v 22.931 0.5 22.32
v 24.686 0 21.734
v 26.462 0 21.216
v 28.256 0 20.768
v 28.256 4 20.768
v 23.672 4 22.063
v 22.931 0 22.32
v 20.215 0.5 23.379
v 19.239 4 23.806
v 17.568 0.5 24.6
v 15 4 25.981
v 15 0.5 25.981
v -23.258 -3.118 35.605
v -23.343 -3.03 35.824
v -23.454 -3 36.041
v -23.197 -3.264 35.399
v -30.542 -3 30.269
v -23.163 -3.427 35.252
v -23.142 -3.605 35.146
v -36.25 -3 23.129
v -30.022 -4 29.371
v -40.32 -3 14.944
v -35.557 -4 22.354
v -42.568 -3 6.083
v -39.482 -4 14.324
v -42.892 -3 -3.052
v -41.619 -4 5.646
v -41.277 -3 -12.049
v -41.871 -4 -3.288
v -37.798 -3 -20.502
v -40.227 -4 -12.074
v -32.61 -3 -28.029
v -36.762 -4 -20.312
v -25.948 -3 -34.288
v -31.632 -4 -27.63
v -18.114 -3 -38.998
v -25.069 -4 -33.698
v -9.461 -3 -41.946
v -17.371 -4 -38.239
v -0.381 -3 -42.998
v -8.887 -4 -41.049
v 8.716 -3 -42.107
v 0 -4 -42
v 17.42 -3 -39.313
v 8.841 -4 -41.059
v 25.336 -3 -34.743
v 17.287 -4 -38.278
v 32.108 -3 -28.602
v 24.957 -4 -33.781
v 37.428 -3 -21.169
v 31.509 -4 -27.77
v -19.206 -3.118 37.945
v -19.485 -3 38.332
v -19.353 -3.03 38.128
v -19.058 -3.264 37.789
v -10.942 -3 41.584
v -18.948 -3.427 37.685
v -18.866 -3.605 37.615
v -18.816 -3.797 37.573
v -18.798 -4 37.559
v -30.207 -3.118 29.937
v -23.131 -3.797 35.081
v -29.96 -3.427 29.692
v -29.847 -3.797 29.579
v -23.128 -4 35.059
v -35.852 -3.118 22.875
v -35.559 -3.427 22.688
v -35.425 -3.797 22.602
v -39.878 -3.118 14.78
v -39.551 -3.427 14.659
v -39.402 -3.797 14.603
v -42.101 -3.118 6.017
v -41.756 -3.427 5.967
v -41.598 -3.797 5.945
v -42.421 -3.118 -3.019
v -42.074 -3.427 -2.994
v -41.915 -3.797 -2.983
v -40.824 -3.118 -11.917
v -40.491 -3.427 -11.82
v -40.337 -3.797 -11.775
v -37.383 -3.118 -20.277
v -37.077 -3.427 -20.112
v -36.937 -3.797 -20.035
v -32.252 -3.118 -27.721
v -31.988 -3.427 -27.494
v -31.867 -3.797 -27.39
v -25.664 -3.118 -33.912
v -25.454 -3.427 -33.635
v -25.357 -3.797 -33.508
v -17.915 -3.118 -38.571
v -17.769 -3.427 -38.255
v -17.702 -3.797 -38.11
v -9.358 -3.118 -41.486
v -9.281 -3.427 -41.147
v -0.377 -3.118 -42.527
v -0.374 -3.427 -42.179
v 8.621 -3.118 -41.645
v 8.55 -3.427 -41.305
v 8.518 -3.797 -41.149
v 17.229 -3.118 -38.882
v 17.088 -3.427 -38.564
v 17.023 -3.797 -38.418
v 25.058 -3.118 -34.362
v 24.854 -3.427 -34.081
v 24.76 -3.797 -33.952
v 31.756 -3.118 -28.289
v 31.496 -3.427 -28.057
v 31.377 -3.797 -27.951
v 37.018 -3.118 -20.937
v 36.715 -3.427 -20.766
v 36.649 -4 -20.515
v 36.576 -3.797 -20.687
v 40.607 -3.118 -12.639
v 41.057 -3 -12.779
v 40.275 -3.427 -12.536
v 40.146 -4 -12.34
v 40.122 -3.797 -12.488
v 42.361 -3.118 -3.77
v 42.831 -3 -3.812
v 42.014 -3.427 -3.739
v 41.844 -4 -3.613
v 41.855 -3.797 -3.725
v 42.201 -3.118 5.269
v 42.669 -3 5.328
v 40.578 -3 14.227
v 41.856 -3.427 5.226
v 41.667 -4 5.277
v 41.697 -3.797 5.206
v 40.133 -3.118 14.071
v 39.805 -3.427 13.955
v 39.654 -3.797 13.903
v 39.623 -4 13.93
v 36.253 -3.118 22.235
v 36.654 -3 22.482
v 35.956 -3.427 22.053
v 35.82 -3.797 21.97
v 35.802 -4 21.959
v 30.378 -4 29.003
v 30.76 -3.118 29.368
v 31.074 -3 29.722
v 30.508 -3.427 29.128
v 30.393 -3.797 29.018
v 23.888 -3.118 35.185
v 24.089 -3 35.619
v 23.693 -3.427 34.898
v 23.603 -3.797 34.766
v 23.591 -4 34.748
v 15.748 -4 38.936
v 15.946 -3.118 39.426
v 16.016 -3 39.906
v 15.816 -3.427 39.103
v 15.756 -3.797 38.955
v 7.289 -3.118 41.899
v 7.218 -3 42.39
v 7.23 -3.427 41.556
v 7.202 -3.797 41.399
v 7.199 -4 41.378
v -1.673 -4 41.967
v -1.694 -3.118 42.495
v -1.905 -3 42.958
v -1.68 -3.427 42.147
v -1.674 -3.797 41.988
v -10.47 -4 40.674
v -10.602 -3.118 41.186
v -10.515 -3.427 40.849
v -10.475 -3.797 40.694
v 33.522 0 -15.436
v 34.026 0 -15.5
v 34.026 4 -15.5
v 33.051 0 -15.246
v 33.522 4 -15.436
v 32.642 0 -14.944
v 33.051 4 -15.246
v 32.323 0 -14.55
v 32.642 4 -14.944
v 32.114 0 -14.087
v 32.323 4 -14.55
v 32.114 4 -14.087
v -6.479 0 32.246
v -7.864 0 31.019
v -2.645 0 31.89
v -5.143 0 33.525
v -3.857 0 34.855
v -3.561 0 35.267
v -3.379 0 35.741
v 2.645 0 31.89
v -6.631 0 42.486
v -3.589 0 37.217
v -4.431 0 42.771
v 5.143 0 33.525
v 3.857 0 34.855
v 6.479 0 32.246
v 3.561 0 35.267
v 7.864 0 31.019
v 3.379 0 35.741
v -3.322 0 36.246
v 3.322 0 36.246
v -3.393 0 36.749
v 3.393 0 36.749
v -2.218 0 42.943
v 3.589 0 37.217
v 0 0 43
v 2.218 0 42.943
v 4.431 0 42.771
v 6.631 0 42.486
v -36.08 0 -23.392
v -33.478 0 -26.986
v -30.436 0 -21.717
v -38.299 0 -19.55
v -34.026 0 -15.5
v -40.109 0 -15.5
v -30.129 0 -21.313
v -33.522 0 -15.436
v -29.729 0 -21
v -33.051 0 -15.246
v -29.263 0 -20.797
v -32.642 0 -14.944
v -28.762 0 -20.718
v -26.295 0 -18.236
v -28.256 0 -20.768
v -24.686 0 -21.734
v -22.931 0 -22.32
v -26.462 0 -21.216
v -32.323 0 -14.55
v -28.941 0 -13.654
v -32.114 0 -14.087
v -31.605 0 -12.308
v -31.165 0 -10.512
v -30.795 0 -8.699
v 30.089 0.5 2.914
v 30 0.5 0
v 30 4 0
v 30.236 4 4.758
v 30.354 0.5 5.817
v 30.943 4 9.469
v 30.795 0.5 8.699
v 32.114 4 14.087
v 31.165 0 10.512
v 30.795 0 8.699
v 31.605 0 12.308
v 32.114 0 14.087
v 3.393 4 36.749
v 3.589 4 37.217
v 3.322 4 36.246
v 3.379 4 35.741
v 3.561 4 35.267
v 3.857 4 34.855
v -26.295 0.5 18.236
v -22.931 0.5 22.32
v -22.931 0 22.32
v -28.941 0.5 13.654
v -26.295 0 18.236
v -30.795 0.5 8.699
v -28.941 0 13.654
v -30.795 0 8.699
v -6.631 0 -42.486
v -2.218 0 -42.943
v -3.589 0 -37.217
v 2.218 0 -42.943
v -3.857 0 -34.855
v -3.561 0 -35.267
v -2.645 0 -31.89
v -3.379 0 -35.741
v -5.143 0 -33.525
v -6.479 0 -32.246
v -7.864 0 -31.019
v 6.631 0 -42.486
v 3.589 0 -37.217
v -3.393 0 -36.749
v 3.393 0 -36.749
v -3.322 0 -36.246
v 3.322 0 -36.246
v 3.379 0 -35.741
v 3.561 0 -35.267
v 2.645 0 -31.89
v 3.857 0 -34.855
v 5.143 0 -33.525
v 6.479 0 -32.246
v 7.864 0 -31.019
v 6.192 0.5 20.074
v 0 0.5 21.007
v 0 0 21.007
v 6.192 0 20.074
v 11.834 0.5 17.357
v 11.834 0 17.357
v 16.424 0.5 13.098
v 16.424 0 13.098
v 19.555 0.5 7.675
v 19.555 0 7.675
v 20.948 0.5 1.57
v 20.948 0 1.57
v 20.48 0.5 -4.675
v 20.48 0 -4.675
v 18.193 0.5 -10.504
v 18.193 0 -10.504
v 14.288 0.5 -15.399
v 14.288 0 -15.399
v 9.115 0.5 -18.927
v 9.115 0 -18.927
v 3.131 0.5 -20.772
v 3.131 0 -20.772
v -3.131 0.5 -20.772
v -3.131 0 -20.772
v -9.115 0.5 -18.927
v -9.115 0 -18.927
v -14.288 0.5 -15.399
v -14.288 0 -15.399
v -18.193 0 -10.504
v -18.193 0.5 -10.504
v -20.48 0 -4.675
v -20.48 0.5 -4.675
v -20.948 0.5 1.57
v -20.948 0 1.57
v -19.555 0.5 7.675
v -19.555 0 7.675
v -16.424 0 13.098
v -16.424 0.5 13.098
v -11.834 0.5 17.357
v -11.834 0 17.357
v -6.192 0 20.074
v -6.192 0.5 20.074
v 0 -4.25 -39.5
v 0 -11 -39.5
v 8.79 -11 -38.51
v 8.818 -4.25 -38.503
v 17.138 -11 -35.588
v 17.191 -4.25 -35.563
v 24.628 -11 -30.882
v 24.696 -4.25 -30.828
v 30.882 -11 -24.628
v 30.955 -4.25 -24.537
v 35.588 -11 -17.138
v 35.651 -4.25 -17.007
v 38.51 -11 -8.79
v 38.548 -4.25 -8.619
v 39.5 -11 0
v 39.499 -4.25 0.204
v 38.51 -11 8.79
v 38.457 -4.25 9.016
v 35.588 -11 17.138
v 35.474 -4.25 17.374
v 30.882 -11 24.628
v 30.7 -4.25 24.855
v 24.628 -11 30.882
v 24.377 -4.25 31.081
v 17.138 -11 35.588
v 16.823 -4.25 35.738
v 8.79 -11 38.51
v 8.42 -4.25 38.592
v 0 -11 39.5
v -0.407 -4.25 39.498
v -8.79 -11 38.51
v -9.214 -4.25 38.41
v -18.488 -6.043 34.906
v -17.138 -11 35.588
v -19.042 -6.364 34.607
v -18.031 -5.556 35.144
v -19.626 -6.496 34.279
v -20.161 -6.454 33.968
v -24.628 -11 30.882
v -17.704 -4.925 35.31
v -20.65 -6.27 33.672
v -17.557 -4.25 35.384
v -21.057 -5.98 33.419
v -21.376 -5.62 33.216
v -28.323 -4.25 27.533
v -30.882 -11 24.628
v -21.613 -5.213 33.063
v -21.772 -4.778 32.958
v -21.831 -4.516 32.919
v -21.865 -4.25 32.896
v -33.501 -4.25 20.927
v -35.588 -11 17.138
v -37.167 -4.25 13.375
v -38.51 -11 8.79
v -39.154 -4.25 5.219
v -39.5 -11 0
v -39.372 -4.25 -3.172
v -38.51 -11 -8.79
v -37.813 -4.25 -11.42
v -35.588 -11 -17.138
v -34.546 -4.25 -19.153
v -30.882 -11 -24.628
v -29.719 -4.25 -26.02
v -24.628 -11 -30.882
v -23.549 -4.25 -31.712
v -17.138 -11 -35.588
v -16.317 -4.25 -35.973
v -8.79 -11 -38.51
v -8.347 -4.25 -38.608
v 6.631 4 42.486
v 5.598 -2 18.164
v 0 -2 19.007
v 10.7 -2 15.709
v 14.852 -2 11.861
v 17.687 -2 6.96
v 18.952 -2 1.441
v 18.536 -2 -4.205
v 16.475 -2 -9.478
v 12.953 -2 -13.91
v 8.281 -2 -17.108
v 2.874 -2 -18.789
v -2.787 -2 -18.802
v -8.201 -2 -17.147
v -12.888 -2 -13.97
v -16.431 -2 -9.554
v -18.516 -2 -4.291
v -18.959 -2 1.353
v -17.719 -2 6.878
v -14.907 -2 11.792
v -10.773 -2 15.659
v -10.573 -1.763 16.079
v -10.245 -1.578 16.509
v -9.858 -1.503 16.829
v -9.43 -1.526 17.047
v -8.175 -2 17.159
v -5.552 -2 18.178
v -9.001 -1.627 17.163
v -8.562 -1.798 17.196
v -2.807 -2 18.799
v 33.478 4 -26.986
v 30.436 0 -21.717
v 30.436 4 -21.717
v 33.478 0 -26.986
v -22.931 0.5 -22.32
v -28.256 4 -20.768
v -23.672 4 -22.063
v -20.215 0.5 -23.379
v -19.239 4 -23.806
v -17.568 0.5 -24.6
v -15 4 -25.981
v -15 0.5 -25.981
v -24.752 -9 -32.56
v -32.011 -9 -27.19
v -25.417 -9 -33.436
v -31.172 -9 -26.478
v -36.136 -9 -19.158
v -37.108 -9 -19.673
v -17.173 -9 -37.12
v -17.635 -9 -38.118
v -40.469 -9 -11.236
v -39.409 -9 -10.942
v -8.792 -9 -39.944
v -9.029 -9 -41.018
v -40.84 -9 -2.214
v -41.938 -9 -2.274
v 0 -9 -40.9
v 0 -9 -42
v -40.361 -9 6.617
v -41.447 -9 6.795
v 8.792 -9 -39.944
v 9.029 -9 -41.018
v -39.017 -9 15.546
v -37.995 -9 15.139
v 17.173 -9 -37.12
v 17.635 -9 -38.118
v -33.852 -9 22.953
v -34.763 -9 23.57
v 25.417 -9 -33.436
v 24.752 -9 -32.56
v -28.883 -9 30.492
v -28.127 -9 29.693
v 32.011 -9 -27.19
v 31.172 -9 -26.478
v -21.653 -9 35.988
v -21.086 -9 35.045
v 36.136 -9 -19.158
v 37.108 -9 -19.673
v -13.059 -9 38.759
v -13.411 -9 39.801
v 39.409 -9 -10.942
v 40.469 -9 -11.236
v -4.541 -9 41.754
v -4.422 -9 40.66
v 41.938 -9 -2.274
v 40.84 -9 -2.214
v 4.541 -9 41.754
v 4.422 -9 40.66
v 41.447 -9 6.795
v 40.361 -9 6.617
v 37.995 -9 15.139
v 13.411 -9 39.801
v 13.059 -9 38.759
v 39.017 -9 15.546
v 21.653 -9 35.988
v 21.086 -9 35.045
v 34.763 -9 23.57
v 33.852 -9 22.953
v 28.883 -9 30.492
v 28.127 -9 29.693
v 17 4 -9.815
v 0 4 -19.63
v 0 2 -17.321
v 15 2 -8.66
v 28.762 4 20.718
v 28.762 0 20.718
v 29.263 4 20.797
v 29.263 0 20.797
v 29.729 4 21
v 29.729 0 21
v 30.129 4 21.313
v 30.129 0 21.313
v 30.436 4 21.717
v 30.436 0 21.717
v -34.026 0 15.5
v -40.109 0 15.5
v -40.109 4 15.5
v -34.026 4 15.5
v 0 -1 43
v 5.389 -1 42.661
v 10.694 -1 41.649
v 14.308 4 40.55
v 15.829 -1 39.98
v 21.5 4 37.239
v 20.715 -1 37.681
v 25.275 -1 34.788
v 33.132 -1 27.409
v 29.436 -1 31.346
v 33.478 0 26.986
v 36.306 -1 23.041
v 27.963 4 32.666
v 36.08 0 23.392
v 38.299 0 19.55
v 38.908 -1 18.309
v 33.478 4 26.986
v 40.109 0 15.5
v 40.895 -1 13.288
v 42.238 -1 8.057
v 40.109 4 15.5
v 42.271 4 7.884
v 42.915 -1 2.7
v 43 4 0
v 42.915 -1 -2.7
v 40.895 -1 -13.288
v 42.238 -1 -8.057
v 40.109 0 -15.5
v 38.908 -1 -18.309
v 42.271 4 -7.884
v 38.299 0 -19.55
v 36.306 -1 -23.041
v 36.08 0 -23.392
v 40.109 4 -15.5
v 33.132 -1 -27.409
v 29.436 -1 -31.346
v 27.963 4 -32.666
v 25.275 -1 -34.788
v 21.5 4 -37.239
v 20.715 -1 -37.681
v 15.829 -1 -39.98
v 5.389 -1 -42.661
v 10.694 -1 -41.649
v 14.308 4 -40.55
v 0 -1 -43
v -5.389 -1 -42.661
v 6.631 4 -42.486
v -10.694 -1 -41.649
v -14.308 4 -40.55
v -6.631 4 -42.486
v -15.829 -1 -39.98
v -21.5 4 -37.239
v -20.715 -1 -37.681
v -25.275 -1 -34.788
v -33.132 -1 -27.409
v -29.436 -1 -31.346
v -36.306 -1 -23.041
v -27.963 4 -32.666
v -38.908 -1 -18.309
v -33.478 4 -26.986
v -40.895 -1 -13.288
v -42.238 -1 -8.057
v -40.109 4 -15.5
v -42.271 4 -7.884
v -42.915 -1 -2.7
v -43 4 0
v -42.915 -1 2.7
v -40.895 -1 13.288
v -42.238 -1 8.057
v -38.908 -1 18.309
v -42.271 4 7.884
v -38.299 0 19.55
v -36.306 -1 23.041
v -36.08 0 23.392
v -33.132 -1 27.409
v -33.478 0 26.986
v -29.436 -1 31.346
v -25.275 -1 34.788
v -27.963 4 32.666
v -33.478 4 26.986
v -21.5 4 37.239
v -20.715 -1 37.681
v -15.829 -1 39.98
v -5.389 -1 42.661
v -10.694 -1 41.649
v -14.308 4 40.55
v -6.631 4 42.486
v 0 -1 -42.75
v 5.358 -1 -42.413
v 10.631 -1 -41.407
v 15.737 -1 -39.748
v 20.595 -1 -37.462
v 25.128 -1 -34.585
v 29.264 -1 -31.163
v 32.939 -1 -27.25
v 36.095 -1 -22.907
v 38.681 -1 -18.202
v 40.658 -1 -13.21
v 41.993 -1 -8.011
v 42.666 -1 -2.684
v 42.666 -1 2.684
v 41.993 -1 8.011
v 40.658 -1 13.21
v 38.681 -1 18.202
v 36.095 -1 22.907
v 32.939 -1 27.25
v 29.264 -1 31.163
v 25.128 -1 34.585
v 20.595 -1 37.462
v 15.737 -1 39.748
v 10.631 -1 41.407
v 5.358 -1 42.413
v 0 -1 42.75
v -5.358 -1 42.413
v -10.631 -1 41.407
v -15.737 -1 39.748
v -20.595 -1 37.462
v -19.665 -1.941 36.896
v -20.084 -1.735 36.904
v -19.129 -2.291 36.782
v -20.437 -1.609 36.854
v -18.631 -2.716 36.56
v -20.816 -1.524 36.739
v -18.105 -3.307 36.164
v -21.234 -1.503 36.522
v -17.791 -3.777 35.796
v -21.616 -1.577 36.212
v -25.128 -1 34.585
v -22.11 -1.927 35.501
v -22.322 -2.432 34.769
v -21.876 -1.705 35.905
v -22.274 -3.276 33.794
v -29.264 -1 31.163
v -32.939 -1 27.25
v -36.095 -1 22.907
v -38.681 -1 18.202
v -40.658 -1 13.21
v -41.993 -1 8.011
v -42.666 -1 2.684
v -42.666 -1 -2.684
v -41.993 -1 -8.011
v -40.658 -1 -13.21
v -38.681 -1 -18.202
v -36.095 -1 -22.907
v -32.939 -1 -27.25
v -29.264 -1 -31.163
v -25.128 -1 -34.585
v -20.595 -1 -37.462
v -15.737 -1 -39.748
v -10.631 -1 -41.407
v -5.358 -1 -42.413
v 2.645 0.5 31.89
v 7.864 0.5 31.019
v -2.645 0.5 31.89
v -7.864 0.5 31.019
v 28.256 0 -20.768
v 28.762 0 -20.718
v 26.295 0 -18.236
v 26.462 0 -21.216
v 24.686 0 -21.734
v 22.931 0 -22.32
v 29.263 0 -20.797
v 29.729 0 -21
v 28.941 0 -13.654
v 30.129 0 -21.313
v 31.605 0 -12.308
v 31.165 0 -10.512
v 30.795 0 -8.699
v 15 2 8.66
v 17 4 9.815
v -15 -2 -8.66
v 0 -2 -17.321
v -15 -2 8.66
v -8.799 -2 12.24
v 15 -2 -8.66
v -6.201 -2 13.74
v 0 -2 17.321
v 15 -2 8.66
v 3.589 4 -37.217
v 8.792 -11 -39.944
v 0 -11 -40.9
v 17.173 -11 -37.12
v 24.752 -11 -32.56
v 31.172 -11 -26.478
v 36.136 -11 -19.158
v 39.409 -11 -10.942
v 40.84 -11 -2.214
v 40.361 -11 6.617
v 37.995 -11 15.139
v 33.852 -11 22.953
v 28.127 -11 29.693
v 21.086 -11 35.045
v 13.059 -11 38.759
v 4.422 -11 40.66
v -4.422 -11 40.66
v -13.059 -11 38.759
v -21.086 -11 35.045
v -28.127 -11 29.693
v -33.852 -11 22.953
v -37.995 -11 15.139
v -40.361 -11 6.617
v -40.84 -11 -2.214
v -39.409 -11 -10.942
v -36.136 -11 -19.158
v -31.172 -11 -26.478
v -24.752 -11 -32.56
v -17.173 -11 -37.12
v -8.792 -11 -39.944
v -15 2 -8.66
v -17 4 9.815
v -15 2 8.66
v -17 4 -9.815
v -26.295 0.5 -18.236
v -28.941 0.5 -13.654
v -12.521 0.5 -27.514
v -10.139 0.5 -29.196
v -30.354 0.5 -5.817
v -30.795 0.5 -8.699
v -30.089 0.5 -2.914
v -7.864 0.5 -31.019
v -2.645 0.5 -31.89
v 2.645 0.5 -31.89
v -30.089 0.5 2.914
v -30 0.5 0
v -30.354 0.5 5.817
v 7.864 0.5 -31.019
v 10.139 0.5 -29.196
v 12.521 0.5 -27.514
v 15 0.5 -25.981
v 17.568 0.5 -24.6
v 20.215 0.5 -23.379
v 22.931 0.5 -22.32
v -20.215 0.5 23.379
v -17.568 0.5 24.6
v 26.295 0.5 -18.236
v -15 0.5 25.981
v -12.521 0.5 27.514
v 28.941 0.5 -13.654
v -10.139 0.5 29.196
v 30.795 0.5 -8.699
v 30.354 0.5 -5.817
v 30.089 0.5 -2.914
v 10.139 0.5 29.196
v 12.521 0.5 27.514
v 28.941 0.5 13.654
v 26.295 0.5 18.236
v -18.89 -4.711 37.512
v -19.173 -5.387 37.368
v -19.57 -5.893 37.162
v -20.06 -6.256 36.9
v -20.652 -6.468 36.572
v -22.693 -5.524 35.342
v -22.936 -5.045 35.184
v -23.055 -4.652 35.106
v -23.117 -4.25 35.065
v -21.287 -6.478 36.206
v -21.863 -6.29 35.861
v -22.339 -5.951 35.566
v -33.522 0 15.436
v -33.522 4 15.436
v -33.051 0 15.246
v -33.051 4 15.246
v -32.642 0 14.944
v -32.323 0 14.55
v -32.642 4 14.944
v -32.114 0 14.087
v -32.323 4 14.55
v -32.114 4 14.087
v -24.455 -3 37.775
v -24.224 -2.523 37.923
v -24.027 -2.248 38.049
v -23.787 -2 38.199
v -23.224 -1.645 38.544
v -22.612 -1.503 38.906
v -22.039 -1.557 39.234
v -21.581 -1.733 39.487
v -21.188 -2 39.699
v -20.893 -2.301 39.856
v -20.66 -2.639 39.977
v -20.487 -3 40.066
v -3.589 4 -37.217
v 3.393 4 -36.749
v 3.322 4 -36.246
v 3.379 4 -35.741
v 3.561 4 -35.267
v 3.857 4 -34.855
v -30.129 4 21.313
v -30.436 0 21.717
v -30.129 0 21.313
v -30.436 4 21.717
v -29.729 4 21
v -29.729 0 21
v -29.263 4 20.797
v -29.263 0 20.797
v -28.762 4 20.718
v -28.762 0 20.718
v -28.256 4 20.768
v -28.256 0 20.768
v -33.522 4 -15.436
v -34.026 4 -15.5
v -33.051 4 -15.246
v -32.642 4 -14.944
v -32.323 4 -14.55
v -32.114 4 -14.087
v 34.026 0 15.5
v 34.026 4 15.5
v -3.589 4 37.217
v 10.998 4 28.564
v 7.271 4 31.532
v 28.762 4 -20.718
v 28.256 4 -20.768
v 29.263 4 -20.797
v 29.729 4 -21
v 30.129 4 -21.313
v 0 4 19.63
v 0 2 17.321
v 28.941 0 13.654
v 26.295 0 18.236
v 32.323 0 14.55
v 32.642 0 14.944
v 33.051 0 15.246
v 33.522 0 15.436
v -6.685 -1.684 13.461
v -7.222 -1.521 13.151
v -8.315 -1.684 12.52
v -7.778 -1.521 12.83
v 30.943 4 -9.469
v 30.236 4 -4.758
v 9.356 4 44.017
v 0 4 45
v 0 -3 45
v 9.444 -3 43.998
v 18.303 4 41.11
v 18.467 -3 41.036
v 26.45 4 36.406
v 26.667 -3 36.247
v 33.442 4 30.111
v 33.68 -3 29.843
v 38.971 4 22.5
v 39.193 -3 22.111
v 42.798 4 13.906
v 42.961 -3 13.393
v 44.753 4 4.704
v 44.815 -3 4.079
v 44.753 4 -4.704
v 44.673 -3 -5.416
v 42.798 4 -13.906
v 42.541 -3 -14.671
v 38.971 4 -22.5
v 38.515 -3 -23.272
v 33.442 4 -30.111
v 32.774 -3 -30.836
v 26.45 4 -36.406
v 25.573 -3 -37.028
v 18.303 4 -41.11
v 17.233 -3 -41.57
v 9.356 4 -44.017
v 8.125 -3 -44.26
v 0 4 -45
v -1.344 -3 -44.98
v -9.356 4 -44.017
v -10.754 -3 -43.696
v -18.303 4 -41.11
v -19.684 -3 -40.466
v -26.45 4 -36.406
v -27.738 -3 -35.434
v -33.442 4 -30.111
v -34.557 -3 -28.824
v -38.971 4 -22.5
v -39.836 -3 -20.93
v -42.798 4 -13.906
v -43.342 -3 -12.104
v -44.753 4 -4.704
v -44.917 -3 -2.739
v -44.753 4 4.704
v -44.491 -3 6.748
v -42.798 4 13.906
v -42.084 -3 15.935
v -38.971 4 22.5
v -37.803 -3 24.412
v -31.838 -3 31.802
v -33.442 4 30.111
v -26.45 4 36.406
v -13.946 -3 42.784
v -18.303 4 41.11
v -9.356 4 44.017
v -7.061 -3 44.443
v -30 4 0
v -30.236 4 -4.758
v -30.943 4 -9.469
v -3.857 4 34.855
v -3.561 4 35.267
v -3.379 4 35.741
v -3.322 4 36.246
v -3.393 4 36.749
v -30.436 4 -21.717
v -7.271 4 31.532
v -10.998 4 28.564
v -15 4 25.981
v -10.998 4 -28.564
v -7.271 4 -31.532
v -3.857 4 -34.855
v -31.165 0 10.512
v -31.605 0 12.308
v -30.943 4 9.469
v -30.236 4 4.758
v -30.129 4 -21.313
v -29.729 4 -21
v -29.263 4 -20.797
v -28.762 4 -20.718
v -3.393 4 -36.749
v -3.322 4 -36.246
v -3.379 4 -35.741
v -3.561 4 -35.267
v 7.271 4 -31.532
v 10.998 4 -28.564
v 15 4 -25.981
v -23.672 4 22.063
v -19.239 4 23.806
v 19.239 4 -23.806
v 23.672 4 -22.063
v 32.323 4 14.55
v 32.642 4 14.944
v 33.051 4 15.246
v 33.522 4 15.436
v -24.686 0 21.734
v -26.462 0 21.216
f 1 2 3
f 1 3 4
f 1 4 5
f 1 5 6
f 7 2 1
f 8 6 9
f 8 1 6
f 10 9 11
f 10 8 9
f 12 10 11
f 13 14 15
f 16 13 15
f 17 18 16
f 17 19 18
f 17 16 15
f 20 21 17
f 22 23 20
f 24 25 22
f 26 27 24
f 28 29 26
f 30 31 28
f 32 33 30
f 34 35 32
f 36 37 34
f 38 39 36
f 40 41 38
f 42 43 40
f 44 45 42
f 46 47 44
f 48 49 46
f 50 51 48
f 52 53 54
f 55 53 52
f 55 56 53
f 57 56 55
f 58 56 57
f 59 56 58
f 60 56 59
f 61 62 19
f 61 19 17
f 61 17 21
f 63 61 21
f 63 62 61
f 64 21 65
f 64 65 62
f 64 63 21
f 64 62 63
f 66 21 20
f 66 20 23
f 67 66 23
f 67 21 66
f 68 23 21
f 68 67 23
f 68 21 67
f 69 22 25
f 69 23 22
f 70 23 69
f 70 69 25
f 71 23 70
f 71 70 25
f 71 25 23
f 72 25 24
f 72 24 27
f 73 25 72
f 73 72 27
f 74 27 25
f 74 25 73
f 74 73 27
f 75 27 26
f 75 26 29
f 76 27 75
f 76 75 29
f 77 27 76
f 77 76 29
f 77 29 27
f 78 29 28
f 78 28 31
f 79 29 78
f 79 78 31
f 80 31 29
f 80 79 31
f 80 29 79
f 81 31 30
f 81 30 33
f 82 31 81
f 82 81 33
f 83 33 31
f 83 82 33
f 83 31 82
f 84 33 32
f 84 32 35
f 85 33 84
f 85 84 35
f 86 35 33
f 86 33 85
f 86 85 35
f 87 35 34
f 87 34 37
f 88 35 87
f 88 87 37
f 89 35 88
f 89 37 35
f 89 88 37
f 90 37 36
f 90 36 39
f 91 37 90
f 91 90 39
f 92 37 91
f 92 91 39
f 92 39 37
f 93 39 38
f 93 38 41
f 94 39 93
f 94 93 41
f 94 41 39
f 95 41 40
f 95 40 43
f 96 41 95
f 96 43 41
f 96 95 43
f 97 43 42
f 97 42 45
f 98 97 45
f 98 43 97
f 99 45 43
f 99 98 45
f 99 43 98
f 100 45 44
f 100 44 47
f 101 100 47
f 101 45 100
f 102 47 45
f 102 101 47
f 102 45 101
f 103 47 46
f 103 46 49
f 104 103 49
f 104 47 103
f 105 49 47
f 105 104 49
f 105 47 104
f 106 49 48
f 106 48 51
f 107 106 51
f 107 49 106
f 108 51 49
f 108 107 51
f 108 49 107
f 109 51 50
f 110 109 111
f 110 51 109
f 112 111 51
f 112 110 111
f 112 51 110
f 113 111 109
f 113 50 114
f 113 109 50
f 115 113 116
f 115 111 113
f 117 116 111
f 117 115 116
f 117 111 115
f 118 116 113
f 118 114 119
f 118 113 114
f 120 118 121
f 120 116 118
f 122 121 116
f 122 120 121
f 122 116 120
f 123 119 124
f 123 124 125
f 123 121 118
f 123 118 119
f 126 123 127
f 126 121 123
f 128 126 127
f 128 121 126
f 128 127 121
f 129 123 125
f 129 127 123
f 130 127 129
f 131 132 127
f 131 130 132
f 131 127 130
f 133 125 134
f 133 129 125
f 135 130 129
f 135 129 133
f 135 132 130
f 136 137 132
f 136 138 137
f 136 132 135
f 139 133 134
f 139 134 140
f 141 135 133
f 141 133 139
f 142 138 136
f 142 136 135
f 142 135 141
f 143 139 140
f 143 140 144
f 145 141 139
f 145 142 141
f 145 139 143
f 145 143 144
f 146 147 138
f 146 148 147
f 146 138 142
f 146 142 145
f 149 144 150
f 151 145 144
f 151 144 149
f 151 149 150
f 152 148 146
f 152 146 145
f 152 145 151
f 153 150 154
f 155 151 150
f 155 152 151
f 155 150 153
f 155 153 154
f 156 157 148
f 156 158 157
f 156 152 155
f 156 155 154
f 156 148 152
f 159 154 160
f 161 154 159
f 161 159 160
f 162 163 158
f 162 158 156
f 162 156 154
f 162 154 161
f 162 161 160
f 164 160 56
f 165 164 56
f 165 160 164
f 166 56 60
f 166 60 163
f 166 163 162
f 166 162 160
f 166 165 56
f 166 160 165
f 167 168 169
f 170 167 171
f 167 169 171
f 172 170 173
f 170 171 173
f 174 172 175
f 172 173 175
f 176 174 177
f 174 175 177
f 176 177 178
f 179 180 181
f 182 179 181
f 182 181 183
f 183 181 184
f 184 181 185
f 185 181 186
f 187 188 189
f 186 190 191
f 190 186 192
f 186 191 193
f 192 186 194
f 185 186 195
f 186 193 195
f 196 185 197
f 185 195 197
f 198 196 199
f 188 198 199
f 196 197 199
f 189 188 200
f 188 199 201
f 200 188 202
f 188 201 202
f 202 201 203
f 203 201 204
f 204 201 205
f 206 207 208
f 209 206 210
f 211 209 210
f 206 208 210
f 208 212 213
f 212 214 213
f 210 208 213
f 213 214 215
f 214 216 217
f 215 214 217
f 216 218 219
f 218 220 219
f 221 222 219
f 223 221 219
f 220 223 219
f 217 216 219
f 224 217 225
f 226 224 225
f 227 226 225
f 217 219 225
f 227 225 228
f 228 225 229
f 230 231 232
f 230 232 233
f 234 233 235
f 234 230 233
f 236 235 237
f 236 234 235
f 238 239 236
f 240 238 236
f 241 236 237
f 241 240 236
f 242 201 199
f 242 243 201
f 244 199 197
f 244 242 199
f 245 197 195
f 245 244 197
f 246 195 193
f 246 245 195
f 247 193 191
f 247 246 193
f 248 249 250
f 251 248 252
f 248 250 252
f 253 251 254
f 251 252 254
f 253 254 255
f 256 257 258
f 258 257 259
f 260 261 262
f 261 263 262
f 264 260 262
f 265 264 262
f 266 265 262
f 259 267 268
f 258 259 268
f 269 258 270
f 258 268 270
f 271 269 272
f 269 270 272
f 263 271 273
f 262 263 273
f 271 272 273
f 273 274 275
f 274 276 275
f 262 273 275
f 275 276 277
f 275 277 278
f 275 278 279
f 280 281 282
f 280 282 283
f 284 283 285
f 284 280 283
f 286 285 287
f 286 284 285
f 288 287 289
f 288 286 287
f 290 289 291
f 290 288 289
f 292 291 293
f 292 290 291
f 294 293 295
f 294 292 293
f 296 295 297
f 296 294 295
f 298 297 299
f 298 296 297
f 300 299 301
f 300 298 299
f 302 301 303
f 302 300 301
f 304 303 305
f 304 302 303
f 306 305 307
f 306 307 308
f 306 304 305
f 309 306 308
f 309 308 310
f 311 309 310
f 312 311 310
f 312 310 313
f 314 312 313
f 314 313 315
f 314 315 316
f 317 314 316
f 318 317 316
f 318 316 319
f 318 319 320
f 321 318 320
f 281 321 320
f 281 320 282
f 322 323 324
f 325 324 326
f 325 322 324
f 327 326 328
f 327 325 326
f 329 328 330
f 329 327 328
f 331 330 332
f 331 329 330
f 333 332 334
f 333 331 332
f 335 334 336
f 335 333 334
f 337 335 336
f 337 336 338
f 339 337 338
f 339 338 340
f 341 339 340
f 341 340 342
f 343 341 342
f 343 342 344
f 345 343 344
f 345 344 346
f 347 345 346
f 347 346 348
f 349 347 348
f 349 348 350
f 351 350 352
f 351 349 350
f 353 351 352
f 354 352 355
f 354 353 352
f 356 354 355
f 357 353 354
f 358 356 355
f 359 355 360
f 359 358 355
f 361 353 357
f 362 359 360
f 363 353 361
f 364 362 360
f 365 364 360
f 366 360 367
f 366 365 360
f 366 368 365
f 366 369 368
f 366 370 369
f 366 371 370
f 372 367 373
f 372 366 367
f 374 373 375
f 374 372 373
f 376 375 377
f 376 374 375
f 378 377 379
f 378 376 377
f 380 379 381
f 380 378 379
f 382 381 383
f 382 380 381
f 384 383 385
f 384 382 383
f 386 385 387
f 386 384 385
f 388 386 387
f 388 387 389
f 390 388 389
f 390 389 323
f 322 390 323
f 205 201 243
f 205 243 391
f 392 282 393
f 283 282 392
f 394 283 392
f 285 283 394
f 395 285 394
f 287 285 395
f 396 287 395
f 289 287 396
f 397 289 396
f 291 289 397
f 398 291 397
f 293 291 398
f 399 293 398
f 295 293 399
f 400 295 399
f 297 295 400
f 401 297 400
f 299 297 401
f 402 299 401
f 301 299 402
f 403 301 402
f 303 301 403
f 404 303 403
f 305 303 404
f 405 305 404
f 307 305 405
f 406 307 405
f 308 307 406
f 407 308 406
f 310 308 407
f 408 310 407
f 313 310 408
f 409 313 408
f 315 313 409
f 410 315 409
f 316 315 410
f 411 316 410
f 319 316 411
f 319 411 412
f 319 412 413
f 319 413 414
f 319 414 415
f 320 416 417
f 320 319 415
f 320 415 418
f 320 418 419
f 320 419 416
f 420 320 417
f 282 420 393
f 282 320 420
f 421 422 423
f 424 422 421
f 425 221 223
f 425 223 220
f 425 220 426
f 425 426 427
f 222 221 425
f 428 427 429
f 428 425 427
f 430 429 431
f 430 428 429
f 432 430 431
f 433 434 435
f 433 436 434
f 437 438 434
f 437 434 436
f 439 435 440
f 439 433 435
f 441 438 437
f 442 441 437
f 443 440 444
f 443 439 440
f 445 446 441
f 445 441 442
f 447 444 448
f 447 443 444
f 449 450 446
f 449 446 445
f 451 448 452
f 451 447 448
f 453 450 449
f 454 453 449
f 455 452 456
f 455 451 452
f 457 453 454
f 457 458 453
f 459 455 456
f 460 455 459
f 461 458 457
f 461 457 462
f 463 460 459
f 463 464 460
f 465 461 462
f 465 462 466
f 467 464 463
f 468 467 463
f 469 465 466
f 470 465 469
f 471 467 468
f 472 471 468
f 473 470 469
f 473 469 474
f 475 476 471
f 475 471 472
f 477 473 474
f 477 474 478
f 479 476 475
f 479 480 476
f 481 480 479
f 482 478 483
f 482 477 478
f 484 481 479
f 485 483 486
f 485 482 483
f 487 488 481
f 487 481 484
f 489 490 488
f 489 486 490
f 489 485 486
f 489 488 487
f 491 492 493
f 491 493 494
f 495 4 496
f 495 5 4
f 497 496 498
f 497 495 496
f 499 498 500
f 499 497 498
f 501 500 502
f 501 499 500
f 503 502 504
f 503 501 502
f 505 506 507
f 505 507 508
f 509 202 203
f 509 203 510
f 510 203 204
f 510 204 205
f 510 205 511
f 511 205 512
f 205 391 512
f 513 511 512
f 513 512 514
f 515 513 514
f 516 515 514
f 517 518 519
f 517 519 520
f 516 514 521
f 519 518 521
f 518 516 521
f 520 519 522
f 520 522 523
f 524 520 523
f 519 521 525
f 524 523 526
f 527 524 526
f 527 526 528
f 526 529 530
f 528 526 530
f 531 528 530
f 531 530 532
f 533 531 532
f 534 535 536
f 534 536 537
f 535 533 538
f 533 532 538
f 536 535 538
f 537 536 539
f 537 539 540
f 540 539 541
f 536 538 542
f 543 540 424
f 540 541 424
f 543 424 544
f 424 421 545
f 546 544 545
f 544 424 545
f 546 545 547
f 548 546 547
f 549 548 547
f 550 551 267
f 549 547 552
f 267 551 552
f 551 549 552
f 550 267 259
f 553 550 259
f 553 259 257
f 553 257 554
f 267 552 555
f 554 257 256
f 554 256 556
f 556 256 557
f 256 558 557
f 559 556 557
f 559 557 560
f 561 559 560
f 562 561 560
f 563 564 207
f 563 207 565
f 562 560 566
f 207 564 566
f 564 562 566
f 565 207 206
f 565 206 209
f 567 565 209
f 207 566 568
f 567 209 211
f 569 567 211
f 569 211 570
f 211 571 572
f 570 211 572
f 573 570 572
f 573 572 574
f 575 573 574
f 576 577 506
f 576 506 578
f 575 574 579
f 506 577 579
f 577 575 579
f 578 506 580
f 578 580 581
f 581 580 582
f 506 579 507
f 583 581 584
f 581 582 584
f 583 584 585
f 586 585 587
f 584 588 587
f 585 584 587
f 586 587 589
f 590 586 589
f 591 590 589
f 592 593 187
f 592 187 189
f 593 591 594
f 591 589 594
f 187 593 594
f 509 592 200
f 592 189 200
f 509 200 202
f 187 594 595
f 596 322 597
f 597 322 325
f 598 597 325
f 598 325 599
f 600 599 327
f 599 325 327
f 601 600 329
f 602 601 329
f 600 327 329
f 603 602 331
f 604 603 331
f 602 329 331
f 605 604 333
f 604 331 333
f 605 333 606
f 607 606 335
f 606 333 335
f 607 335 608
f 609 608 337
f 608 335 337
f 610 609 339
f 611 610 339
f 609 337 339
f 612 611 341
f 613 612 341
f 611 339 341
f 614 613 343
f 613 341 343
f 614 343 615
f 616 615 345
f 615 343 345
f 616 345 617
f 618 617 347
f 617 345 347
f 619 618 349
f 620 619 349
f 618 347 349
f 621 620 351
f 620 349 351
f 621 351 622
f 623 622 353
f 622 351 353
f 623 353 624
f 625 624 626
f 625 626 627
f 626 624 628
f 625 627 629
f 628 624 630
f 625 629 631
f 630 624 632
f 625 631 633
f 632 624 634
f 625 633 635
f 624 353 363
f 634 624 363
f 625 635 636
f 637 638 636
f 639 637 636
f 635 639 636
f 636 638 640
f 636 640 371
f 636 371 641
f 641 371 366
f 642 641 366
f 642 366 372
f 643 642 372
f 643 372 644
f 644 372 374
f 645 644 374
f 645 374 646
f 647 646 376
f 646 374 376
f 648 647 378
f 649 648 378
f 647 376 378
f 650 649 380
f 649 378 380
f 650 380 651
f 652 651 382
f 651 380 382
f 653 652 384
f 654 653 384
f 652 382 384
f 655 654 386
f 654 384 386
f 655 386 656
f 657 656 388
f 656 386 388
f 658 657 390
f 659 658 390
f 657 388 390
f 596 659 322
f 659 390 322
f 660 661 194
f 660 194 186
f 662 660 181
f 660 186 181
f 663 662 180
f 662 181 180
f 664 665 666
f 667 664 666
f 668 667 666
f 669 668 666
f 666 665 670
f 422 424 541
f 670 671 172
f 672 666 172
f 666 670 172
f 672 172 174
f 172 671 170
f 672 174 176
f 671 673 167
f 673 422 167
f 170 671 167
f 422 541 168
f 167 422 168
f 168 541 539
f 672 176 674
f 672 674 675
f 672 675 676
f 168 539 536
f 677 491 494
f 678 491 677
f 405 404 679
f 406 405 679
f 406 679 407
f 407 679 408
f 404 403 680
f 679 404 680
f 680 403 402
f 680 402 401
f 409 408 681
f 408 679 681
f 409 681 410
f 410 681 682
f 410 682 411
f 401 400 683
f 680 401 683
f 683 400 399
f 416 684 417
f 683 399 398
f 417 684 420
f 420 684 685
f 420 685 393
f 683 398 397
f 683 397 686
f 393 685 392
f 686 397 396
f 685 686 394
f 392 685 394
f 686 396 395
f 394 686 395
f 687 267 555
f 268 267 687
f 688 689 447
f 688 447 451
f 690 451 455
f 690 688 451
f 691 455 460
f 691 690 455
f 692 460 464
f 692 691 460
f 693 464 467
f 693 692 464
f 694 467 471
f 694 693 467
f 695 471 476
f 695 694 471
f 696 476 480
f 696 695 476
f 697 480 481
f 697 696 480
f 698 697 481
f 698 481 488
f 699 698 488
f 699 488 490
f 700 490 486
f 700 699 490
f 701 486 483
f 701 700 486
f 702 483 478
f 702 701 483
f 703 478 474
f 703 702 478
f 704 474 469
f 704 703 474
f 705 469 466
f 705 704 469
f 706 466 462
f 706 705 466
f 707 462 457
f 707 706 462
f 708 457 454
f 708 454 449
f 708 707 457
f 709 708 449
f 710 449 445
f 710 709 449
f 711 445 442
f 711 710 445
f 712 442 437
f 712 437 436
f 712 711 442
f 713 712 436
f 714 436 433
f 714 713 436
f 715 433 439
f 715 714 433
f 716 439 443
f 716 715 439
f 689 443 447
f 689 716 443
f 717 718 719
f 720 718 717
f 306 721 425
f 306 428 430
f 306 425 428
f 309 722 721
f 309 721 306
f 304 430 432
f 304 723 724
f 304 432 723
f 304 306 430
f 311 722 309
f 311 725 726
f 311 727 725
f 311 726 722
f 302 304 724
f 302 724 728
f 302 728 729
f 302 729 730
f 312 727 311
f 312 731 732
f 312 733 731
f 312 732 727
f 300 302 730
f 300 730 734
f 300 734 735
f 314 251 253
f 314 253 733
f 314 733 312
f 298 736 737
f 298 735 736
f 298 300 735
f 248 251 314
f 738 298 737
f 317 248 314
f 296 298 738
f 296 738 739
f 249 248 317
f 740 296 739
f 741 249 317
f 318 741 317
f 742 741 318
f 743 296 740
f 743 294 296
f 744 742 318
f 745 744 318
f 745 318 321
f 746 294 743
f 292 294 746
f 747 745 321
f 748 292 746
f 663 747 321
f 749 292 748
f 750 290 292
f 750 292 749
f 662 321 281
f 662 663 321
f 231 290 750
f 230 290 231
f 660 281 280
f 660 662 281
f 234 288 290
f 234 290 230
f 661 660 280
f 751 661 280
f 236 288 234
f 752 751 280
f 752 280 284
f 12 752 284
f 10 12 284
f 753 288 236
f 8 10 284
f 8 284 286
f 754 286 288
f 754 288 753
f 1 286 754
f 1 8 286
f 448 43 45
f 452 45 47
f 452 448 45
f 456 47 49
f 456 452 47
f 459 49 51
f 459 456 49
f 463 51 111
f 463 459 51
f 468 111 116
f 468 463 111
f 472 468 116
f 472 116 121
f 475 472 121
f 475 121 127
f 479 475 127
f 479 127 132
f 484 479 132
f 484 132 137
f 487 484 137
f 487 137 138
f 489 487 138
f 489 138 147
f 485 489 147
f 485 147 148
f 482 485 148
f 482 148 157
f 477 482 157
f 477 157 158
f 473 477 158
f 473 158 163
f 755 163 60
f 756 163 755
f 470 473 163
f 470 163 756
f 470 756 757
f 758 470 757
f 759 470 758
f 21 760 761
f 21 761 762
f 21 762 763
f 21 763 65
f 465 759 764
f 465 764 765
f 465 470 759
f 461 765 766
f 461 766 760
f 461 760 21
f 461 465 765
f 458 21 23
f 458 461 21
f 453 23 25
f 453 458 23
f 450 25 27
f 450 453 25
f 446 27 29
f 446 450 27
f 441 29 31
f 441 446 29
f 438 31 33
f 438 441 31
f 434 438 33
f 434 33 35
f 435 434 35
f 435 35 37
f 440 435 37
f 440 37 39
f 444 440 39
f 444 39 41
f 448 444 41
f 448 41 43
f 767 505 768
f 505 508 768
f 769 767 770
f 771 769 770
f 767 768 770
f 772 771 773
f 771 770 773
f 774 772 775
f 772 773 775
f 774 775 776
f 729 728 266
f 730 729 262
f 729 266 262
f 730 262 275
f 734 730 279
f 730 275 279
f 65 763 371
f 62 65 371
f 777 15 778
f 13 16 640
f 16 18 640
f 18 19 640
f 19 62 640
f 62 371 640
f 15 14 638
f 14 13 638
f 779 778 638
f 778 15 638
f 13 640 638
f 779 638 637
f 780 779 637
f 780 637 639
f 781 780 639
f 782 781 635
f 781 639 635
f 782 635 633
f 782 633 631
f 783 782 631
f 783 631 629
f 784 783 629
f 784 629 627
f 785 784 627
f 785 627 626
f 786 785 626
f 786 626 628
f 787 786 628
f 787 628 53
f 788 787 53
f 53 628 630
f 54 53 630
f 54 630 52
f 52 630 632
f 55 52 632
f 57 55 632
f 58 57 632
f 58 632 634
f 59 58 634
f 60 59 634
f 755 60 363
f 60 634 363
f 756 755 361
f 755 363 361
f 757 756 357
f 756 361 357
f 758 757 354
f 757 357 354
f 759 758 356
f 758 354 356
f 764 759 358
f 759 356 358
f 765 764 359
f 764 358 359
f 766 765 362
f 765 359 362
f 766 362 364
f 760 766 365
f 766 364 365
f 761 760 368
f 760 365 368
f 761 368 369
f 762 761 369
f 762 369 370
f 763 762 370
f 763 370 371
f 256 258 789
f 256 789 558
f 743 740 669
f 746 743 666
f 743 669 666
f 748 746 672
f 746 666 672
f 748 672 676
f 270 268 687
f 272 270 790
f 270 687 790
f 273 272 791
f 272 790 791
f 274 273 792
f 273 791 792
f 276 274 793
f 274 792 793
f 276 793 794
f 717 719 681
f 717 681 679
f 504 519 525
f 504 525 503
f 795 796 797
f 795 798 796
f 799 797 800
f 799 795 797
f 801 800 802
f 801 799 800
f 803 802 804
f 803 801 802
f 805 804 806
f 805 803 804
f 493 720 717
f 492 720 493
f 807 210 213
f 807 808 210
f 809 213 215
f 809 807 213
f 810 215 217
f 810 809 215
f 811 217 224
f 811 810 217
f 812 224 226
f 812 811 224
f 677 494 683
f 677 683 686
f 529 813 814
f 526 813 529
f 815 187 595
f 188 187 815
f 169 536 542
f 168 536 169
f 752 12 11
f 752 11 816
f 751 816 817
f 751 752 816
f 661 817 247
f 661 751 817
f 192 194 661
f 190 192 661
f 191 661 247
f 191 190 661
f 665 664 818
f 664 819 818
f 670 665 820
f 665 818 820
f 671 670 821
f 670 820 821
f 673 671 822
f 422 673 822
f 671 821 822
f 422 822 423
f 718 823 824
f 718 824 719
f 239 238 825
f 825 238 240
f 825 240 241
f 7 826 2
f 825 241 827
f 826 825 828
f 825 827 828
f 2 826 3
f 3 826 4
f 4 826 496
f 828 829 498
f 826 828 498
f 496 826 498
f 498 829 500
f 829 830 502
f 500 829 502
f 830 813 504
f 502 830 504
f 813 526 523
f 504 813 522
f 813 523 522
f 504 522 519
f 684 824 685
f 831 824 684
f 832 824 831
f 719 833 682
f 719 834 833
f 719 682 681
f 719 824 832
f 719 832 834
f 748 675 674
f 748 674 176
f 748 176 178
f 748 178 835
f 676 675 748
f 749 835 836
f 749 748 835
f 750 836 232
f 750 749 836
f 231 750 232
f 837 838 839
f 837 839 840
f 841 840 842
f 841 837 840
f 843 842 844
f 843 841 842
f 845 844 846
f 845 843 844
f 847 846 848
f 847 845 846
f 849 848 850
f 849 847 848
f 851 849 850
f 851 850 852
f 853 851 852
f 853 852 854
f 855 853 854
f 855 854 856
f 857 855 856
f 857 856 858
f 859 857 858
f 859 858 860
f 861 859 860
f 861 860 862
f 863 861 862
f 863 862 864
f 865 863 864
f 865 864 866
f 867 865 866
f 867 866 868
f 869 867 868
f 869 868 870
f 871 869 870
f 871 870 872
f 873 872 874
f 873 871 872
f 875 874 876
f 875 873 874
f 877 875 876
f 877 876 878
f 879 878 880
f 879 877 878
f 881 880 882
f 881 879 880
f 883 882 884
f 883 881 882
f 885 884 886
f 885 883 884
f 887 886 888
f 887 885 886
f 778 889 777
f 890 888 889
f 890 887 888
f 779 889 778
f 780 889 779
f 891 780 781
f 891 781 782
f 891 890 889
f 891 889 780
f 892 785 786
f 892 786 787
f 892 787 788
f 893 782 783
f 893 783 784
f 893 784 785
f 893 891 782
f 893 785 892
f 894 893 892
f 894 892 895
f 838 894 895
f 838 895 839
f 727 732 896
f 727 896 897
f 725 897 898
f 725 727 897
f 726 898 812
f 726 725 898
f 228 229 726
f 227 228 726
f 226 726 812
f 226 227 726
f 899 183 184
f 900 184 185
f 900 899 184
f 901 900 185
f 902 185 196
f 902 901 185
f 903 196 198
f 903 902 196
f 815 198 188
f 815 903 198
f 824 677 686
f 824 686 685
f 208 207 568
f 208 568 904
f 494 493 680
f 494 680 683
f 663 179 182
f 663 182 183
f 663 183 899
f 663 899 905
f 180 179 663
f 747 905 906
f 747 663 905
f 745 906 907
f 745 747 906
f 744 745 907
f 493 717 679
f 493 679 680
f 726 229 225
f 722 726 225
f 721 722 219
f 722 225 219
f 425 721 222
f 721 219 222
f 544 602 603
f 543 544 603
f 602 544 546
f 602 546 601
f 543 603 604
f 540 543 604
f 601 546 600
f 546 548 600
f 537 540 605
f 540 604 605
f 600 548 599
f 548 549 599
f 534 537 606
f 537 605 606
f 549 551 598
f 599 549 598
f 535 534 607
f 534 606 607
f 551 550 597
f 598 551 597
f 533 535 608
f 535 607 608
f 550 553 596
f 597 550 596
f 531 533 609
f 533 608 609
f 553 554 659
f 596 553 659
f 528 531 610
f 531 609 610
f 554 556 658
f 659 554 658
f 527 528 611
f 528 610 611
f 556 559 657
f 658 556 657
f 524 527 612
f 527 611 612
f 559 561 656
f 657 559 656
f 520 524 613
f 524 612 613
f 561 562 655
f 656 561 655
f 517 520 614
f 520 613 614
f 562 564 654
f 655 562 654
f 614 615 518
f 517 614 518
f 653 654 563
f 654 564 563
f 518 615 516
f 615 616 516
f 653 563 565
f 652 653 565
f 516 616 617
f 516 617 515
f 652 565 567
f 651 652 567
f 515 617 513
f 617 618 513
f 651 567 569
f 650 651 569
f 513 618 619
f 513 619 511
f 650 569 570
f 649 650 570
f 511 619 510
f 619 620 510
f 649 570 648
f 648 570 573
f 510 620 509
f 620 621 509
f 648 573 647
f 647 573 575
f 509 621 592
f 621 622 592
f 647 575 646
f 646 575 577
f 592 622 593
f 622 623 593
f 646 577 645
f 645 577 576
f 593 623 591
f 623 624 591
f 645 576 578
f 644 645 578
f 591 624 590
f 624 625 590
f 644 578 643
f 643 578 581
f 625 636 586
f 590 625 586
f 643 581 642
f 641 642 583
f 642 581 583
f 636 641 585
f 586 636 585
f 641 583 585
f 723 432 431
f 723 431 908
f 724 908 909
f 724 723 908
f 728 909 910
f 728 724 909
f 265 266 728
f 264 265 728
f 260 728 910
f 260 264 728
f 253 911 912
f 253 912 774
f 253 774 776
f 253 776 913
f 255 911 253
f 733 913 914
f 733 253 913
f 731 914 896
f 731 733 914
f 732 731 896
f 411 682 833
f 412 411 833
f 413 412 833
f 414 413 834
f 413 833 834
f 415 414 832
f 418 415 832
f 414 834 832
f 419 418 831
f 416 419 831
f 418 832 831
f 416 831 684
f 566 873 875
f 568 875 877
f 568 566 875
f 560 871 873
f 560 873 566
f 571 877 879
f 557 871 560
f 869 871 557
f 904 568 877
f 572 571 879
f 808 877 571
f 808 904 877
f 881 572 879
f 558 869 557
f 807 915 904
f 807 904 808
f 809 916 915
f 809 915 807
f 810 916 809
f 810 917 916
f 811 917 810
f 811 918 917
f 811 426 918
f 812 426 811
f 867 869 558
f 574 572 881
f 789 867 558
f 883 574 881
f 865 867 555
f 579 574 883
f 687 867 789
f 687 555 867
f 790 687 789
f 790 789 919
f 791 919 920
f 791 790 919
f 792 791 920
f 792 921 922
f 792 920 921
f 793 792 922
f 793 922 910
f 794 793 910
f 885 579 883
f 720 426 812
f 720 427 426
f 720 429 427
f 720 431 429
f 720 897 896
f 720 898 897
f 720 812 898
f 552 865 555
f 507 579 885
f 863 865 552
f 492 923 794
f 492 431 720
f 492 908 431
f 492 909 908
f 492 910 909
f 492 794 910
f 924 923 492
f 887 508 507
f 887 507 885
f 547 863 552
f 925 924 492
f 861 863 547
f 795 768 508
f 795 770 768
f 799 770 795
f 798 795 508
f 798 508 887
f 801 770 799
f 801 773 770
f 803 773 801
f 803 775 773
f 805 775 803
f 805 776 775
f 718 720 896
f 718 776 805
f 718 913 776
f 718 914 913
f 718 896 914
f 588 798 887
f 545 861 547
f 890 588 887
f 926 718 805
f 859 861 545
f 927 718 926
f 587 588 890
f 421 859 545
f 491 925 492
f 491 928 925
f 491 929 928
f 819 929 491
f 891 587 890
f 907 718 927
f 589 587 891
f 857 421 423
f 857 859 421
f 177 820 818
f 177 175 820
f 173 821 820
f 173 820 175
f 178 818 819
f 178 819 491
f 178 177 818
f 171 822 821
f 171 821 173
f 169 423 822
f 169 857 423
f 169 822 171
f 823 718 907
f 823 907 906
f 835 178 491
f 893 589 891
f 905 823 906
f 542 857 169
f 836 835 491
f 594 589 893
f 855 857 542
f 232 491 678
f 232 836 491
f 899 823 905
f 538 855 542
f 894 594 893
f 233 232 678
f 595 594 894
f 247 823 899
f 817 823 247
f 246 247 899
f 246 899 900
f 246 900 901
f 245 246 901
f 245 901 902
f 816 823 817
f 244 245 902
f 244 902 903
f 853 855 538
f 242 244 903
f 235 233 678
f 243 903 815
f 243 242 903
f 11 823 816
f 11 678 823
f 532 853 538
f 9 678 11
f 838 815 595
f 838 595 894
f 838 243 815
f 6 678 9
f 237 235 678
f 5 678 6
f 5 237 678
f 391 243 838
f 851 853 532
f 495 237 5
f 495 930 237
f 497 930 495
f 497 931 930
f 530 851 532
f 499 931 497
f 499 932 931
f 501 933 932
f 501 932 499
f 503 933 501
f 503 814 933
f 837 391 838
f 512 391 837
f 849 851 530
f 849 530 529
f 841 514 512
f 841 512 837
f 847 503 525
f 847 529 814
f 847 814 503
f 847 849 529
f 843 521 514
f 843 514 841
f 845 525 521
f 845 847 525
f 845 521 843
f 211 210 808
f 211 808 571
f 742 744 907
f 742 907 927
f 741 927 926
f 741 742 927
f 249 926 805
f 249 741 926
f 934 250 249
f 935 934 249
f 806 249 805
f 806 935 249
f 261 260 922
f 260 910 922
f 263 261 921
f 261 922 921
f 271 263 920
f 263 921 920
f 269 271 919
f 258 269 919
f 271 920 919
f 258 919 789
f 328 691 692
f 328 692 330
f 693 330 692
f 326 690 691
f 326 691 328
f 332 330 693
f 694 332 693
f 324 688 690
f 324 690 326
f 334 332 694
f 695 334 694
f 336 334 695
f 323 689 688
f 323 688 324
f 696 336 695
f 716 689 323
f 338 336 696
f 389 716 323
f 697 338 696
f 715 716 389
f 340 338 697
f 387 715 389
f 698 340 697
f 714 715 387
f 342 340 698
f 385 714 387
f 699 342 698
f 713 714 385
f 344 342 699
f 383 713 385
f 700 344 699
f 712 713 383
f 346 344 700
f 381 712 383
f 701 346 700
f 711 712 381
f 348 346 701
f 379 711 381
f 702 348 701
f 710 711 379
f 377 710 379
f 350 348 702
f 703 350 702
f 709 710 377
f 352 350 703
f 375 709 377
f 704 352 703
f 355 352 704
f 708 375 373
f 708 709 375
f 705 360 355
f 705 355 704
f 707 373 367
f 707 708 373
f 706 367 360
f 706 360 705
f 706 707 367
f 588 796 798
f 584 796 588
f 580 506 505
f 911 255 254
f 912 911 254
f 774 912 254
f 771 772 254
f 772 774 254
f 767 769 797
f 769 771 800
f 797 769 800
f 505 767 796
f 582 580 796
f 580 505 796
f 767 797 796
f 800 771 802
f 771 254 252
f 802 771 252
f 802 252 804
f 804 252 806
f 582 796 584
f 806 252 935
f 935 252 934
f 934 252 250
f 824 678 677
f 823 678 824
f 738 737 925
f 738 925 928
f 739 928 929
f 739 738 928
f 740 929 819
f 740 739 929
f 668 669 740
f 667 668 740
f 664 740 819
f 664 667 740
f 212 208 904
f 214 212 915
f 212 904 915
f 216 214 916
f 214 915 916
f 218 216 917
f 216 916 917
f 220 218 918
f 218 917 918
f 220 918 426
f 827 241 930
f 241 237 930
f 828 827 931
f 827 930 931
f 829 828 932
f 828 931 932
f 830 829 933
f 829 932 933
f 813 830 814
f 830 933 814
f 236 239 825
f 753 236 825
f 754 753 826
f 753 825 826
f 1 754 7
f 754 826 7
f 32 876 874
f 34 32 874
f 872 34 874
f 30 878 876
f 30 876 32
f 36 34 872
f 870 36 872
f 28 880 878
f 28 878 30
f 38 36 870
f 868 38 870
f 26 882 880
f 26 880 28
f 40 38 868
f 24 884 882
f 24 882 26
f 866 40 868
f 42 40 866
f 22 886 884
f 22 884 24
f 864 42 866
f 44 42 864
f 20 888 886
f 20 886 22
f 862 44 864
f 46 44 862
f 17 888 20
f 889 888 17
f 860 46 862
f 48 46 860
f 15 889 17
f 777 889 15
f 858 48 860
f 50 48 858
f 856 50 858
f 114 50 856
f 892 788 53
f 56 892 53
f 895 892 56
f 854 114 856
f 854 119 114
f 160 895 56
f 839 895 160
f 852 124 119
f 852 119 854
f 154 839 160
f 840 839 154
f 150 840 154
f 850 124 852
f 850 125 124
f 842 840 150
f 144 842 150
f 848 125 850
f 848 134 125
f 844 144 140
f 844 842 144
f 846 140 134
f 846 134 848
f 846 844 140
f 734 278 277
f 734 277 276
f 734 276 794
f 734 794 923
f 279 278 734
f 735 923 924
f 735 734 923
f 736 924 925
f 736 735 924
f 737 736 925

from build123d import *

# Parameters (mm, degrees)
SKIZZE1_R                             = 44
AUFSATZ_LINEAR_AUSTRAGEN1_DEPTH       = 4
SCHNITT_LINEAR_START                  = -10
SCHNITT_LINEAR_AUSTRAGEN2_DEPTH       = 10
KREISMUSTER1_COUNT                    = 6
SCHNITT_LINEAR_AUSTRAGEN3_DEPTH       = 4
SCHNITT_LINEAR_AUSTRAGEN3_DEPTH_BACK  = 10
VERRUNDUNG1_R                         = 2
SKIZZE7_R                             = 32
SCHNITT_LINEAR_AUSTRAGEN7_DEPTH       = 0.5
SKIZZE8_R                             = 45
SKIZZE8_R_2                           = 43
AUFSATZ_LINEAR_AUSTRAGEN2_DEPTH       = 6
AUFSATZ_LINEAR_AUSTRAGEN3_DEPTH       = 9
AUFSATZ_LINEAR_AUSTRAGEN3_DEPTH_BACK  = 1
SKIZZE9_R                             = 45
SKIZZE9_R_2                           = 39.5
SKIZZE4_R                             = 21.007106764
AUFSATZ_LINEAR_AUSTRAGEN8_DEPTH       = 6
FASE1_SIZE                            = 3.25
SKIZZE10_R                            = 50
SKIZZE10_R_2                          = 42
SCHNITT_LINEAR_AUSTRAGEN9_DEPTH       = 8
SKIZZE11_R                            = 50
SKIZZE11_R_2                          = 40.9
SCHNITT_LINEAR_AUSTRAGEN10_DEPTH      = 2
SCHNITT_LINEAR_AUSTRAGEN11_DEPTH      = 6
SCHNITT_LINEAR_AUSTRAGEN11_DEPTH_BACK = 6
FASE3_SIZE                            = 2
FASE5_SIZE                            = 2
SKIZZE12_R                            = 2.5
SCHNITT_LINEAR_AUSTRAGEN12_DEPTH      = 79.994520679
VERRUNDUNG2_R                         = 1


with BuildPart() as part:
    # Skizze1 → Aufsatz-Linear austragen1 (new body)
    with BuildSketch(Plane(origin=(0, 0, 0), x_dir=(1, 0, 0), z_dir=(0, 1, 0))):
        Circle(SKIZZE1_R)
    extrude(amount=AUFSATZ_LINEAR_AUSTRAGEN1_DEPTH)

    # Skizze2 → Schnitt-Linear austragen2 (cut)
    with BuildSketch(Plane(origin=(0, 4, 0), x_dir=(1, 0, 0), z_dir=(0, 1, 0)).offset(SCHNITT_LINEAR_START)):
        with BuildLine():
            ThreePointArc((-30, 0), (-30.647234858, 7.855929826), (-32.571484726, 15.5))
            Line((-32.571484726, 15.5), (-41.179485184, 15.5))
            ThreePointArc((-41.179485184, 15.5), (-44, 0), (-41.179485184, -15.5))
            Line((-41.179485184, -15.5), (-32.571484726, -15.5))
            ThreePointArc((-32.571484726, -15.5), (-30.647234858, -7.855929826), (-30, 0))
        make_face()
    schnitt_linear_austragen2 = extrude(amount=SCHNITT_LINEAR_AUSTRAGEN2_DEPTH, mode=Mode.SUBTRACT)

    # Kreismuster1: Schnitt-Linear austragen2 ×6 about axis
    kreismuster1_axis = Axis((0, 0, 0), (0, 1, 0))
    for i in range(1, KREISMUSTER1_COUNT):
        add(schnitt_linear_austragen2.rotate(kreismuster1_axis, i * 360 / KREISMUSTER1_COUNT), mode=Mode.SUBTRACT)

    # Skizze3 → Schnitt-Linear austragen3 (cut, two sides: drawn at the far end of the back side and taken through both)
    with BuildSketch(Plane.XZ.offset(-SCHNITT_LINEAR_AUSTRAGEN3_DEPTH_BACK)):
        Polygon((15, 8.660254038), (0, 17.320508076), (-15, 8.660254038), (-15, -8.660254038), (0, -17.320508076), (15, -8.660254038), align=None)
    extrude(amount=SCHNITT_LINEAR_AUSTRAGEN3_DEPTH + SCHNITT_LINEAR_AUSTRAGEN3_DEPTH_BACK, mode=Mode.SUBTRACT)

    # Verrundung1
    verrundung1_edges = [part.edges().sort_by_distance(p)[0] for p in [
        (-32.571484726, 2, 15.5),
        (-2.862348604, 2, 35.957733212),
        (2.862348604, 2, 35.957733212),
        (29.709136122, 2, 20.457733212),
        (32.571484726, 2, 15.5),
        (32.571484726, 2, -15.5),
        (29.709136122, 2, -20.457733212),
        (2.862348604, 2, -35.957733212),
        (-2.862348604, 2, -35.957733212),
        (-29.709136122, 2, -20.457733212),
        (-32.571484726, 2, -15.5),
        (-29.709136122, 2, 20.457733212),
    ]]
    fillet(verrundung1_edges, radius=VERRUNDUNG1_R)

    # Skizze7 → Schnitt-Linear austragen7 (cut)
    with BuildSketch(Plane.XZ):
        Circle(SKIZZE7_R)
    extrude(amount=-SCHNITT_LINEAR_AUSTRAGEN7_DEPTH, mode=Mode.SUBTRACT)

    # Skizze8 → Aufsatz-Linear austragen2 (add)
    with BuildSketch(Plane(origin=(0, 4, 0), x_dir=(1, 0, 0), z_dir=(0, 1, 0))):
        Circle(SKIZZE8_R)
        Circle(SKIZZE8_R_2, mode=Mode.SUBTRACT)
    extrude(amount=-AUFSATZ_LINEAR_AUSTRAGEN2_DEPTH)



with BuildPart() as body_2:
    # Skizze9 → Aufsatz-Linear austragen3 (new, two sides: drawn at the far end of the back side and taken through both)
    with BuildSketch(Plane.XZ.offset(2).offset(-AUFSATZ_LINEAR_AUSTRAGEN3_DEPTH_BACK)):
        Circle(SKIZZE9_R)
        Circle(SKIZZE9_R_2, mode=Mode.SUBTRACT)
    extrude(amount=AUFSATZ_LINEAR_AUSTRAGEN3_DEPTH + AUFSATZ_LINEAR_AUSTRAGEN3_DEPTH_BACK)


with BuildPart() as part_1:
    add(part.part)

    add(body_2.part)  # Aufsatz-Linear austragen8 merges body 2
    # Skizze4 → Aufsatz-Linear austragen8 (add)
    with BuildSketch(Plane(origin=(0, 4, 0), x_dir=(1, 0, 0), z_dir=(0, 1, 0))):
        Circle(SKIZZE4_R)
    extrude(amount=-AUFSATZ_LINEAR_AUSTRAGEN8_DEPTH)

    # Fase1
    fase1_edges = [part_1.edges().sort_by_distance(p)[0] for p in [
        (-39.5, -1, 0),
    ]]
    chamfer(fase1_edges, length=FASE1_SIZE)

    # Skizze10 → Schnitt-Linear austragen9 (cut)
    with BuildSketch(Plane.XZ.offset(11)):
        Circle(SKIZZE10_R)
        Circle(SKIZZE10_R_2, mode=Mode.SUBTRACT)
    extrude(amount=-SCHNITT_LINEAR_AUSTRAGEN9_DEPTH, mode=Mode.SUBTRACT)

    # Skizze11 → Schnitt-Linear austragen10 (cut)
    with BuildSketch(Plane.XZ.offset(11)):
        with Locations((-1.948563864, 1.772578218)):
            Circle(SKIZZE11_R)
        Circle(SKIZZE11_R_2, mode=Mode.SUBTRACT)
    extrude(amount=-SCHNITT_LINEAR_AUSTRAGEN10_DEPTH, mode=Mode.SUBTRACT)

    # Skizze3<3> → Schnitt-Linear austragen11 (cut, two sides: drawn at the far end of the back side and taken through both)
    with BuildSketch(Plane.XZ.offset(-SCHNITT_LINEAR_AUSTRAGEN11_DEPTH_BACK)):
        Polygon((15, 8.660254038), (0, 17.320508076), (-15, 8.660254038), (-15, -8.660254038), (0, -17.320508076), (15, -8.660254038), align=None)
    extrude(amount=SCHNITT_LINEAR_AUSTRAGEN11_DEPTH + SCHNITT_LINEAR_AUSTRAGEN11_DEPTH_BACK, mode=Mode.SUBTRACT)

    # Fase3
    fase3_edges = [part_1.edges().sort_by_distance(p)[0] for p in [
        (-21.007106764, -2, 0),
    ]]
    chamfer(fase3_edges, length=FASE3_SIZE)

    # Fase5
    fase5_edges = [part_1.edges().sort_by_distance(p)[0] for p in [
        (-7.5, 4, 12.990381057),
        (7.5, 4, 12.990381057),
        (15, 4, 0),
        (7.5, 4, -12.990381057),
        (-7.5, 4, -12.990381057),
        (-15, 4, 0),
    ]]
    chamfer(fase5_edges, length=FASE5_SIZE)

    # Skizze12 → Schnitt-Linear austragen12 (cut, through all)
    with BuildSketch(Plane(origin=(-7.5, 0, 12.990381057), x_dir=(-0.8660254037844387, 0, -0.49999999999999994), z_dir=(0.4999999999999999, 0, -0.8660254037844386))):
        with Locations((0, -4)):
            Circle(SKIZZE12_R)
    extrude(amount=-SCHNITT_LINEAR_AUSTRAGEN12_DEPTH, mode=Mode.SUBTRACT)

    # Verrundung2
    verrundung2_edges = [part_1.edges().sort_by_distance(p)[0] for p in [
        (-19.999653894, -3, -36.93255805),
    ]]
    fillet(verrundung2_edges, radius=VERRUNDUNG2_R)


solid = part_1.part
